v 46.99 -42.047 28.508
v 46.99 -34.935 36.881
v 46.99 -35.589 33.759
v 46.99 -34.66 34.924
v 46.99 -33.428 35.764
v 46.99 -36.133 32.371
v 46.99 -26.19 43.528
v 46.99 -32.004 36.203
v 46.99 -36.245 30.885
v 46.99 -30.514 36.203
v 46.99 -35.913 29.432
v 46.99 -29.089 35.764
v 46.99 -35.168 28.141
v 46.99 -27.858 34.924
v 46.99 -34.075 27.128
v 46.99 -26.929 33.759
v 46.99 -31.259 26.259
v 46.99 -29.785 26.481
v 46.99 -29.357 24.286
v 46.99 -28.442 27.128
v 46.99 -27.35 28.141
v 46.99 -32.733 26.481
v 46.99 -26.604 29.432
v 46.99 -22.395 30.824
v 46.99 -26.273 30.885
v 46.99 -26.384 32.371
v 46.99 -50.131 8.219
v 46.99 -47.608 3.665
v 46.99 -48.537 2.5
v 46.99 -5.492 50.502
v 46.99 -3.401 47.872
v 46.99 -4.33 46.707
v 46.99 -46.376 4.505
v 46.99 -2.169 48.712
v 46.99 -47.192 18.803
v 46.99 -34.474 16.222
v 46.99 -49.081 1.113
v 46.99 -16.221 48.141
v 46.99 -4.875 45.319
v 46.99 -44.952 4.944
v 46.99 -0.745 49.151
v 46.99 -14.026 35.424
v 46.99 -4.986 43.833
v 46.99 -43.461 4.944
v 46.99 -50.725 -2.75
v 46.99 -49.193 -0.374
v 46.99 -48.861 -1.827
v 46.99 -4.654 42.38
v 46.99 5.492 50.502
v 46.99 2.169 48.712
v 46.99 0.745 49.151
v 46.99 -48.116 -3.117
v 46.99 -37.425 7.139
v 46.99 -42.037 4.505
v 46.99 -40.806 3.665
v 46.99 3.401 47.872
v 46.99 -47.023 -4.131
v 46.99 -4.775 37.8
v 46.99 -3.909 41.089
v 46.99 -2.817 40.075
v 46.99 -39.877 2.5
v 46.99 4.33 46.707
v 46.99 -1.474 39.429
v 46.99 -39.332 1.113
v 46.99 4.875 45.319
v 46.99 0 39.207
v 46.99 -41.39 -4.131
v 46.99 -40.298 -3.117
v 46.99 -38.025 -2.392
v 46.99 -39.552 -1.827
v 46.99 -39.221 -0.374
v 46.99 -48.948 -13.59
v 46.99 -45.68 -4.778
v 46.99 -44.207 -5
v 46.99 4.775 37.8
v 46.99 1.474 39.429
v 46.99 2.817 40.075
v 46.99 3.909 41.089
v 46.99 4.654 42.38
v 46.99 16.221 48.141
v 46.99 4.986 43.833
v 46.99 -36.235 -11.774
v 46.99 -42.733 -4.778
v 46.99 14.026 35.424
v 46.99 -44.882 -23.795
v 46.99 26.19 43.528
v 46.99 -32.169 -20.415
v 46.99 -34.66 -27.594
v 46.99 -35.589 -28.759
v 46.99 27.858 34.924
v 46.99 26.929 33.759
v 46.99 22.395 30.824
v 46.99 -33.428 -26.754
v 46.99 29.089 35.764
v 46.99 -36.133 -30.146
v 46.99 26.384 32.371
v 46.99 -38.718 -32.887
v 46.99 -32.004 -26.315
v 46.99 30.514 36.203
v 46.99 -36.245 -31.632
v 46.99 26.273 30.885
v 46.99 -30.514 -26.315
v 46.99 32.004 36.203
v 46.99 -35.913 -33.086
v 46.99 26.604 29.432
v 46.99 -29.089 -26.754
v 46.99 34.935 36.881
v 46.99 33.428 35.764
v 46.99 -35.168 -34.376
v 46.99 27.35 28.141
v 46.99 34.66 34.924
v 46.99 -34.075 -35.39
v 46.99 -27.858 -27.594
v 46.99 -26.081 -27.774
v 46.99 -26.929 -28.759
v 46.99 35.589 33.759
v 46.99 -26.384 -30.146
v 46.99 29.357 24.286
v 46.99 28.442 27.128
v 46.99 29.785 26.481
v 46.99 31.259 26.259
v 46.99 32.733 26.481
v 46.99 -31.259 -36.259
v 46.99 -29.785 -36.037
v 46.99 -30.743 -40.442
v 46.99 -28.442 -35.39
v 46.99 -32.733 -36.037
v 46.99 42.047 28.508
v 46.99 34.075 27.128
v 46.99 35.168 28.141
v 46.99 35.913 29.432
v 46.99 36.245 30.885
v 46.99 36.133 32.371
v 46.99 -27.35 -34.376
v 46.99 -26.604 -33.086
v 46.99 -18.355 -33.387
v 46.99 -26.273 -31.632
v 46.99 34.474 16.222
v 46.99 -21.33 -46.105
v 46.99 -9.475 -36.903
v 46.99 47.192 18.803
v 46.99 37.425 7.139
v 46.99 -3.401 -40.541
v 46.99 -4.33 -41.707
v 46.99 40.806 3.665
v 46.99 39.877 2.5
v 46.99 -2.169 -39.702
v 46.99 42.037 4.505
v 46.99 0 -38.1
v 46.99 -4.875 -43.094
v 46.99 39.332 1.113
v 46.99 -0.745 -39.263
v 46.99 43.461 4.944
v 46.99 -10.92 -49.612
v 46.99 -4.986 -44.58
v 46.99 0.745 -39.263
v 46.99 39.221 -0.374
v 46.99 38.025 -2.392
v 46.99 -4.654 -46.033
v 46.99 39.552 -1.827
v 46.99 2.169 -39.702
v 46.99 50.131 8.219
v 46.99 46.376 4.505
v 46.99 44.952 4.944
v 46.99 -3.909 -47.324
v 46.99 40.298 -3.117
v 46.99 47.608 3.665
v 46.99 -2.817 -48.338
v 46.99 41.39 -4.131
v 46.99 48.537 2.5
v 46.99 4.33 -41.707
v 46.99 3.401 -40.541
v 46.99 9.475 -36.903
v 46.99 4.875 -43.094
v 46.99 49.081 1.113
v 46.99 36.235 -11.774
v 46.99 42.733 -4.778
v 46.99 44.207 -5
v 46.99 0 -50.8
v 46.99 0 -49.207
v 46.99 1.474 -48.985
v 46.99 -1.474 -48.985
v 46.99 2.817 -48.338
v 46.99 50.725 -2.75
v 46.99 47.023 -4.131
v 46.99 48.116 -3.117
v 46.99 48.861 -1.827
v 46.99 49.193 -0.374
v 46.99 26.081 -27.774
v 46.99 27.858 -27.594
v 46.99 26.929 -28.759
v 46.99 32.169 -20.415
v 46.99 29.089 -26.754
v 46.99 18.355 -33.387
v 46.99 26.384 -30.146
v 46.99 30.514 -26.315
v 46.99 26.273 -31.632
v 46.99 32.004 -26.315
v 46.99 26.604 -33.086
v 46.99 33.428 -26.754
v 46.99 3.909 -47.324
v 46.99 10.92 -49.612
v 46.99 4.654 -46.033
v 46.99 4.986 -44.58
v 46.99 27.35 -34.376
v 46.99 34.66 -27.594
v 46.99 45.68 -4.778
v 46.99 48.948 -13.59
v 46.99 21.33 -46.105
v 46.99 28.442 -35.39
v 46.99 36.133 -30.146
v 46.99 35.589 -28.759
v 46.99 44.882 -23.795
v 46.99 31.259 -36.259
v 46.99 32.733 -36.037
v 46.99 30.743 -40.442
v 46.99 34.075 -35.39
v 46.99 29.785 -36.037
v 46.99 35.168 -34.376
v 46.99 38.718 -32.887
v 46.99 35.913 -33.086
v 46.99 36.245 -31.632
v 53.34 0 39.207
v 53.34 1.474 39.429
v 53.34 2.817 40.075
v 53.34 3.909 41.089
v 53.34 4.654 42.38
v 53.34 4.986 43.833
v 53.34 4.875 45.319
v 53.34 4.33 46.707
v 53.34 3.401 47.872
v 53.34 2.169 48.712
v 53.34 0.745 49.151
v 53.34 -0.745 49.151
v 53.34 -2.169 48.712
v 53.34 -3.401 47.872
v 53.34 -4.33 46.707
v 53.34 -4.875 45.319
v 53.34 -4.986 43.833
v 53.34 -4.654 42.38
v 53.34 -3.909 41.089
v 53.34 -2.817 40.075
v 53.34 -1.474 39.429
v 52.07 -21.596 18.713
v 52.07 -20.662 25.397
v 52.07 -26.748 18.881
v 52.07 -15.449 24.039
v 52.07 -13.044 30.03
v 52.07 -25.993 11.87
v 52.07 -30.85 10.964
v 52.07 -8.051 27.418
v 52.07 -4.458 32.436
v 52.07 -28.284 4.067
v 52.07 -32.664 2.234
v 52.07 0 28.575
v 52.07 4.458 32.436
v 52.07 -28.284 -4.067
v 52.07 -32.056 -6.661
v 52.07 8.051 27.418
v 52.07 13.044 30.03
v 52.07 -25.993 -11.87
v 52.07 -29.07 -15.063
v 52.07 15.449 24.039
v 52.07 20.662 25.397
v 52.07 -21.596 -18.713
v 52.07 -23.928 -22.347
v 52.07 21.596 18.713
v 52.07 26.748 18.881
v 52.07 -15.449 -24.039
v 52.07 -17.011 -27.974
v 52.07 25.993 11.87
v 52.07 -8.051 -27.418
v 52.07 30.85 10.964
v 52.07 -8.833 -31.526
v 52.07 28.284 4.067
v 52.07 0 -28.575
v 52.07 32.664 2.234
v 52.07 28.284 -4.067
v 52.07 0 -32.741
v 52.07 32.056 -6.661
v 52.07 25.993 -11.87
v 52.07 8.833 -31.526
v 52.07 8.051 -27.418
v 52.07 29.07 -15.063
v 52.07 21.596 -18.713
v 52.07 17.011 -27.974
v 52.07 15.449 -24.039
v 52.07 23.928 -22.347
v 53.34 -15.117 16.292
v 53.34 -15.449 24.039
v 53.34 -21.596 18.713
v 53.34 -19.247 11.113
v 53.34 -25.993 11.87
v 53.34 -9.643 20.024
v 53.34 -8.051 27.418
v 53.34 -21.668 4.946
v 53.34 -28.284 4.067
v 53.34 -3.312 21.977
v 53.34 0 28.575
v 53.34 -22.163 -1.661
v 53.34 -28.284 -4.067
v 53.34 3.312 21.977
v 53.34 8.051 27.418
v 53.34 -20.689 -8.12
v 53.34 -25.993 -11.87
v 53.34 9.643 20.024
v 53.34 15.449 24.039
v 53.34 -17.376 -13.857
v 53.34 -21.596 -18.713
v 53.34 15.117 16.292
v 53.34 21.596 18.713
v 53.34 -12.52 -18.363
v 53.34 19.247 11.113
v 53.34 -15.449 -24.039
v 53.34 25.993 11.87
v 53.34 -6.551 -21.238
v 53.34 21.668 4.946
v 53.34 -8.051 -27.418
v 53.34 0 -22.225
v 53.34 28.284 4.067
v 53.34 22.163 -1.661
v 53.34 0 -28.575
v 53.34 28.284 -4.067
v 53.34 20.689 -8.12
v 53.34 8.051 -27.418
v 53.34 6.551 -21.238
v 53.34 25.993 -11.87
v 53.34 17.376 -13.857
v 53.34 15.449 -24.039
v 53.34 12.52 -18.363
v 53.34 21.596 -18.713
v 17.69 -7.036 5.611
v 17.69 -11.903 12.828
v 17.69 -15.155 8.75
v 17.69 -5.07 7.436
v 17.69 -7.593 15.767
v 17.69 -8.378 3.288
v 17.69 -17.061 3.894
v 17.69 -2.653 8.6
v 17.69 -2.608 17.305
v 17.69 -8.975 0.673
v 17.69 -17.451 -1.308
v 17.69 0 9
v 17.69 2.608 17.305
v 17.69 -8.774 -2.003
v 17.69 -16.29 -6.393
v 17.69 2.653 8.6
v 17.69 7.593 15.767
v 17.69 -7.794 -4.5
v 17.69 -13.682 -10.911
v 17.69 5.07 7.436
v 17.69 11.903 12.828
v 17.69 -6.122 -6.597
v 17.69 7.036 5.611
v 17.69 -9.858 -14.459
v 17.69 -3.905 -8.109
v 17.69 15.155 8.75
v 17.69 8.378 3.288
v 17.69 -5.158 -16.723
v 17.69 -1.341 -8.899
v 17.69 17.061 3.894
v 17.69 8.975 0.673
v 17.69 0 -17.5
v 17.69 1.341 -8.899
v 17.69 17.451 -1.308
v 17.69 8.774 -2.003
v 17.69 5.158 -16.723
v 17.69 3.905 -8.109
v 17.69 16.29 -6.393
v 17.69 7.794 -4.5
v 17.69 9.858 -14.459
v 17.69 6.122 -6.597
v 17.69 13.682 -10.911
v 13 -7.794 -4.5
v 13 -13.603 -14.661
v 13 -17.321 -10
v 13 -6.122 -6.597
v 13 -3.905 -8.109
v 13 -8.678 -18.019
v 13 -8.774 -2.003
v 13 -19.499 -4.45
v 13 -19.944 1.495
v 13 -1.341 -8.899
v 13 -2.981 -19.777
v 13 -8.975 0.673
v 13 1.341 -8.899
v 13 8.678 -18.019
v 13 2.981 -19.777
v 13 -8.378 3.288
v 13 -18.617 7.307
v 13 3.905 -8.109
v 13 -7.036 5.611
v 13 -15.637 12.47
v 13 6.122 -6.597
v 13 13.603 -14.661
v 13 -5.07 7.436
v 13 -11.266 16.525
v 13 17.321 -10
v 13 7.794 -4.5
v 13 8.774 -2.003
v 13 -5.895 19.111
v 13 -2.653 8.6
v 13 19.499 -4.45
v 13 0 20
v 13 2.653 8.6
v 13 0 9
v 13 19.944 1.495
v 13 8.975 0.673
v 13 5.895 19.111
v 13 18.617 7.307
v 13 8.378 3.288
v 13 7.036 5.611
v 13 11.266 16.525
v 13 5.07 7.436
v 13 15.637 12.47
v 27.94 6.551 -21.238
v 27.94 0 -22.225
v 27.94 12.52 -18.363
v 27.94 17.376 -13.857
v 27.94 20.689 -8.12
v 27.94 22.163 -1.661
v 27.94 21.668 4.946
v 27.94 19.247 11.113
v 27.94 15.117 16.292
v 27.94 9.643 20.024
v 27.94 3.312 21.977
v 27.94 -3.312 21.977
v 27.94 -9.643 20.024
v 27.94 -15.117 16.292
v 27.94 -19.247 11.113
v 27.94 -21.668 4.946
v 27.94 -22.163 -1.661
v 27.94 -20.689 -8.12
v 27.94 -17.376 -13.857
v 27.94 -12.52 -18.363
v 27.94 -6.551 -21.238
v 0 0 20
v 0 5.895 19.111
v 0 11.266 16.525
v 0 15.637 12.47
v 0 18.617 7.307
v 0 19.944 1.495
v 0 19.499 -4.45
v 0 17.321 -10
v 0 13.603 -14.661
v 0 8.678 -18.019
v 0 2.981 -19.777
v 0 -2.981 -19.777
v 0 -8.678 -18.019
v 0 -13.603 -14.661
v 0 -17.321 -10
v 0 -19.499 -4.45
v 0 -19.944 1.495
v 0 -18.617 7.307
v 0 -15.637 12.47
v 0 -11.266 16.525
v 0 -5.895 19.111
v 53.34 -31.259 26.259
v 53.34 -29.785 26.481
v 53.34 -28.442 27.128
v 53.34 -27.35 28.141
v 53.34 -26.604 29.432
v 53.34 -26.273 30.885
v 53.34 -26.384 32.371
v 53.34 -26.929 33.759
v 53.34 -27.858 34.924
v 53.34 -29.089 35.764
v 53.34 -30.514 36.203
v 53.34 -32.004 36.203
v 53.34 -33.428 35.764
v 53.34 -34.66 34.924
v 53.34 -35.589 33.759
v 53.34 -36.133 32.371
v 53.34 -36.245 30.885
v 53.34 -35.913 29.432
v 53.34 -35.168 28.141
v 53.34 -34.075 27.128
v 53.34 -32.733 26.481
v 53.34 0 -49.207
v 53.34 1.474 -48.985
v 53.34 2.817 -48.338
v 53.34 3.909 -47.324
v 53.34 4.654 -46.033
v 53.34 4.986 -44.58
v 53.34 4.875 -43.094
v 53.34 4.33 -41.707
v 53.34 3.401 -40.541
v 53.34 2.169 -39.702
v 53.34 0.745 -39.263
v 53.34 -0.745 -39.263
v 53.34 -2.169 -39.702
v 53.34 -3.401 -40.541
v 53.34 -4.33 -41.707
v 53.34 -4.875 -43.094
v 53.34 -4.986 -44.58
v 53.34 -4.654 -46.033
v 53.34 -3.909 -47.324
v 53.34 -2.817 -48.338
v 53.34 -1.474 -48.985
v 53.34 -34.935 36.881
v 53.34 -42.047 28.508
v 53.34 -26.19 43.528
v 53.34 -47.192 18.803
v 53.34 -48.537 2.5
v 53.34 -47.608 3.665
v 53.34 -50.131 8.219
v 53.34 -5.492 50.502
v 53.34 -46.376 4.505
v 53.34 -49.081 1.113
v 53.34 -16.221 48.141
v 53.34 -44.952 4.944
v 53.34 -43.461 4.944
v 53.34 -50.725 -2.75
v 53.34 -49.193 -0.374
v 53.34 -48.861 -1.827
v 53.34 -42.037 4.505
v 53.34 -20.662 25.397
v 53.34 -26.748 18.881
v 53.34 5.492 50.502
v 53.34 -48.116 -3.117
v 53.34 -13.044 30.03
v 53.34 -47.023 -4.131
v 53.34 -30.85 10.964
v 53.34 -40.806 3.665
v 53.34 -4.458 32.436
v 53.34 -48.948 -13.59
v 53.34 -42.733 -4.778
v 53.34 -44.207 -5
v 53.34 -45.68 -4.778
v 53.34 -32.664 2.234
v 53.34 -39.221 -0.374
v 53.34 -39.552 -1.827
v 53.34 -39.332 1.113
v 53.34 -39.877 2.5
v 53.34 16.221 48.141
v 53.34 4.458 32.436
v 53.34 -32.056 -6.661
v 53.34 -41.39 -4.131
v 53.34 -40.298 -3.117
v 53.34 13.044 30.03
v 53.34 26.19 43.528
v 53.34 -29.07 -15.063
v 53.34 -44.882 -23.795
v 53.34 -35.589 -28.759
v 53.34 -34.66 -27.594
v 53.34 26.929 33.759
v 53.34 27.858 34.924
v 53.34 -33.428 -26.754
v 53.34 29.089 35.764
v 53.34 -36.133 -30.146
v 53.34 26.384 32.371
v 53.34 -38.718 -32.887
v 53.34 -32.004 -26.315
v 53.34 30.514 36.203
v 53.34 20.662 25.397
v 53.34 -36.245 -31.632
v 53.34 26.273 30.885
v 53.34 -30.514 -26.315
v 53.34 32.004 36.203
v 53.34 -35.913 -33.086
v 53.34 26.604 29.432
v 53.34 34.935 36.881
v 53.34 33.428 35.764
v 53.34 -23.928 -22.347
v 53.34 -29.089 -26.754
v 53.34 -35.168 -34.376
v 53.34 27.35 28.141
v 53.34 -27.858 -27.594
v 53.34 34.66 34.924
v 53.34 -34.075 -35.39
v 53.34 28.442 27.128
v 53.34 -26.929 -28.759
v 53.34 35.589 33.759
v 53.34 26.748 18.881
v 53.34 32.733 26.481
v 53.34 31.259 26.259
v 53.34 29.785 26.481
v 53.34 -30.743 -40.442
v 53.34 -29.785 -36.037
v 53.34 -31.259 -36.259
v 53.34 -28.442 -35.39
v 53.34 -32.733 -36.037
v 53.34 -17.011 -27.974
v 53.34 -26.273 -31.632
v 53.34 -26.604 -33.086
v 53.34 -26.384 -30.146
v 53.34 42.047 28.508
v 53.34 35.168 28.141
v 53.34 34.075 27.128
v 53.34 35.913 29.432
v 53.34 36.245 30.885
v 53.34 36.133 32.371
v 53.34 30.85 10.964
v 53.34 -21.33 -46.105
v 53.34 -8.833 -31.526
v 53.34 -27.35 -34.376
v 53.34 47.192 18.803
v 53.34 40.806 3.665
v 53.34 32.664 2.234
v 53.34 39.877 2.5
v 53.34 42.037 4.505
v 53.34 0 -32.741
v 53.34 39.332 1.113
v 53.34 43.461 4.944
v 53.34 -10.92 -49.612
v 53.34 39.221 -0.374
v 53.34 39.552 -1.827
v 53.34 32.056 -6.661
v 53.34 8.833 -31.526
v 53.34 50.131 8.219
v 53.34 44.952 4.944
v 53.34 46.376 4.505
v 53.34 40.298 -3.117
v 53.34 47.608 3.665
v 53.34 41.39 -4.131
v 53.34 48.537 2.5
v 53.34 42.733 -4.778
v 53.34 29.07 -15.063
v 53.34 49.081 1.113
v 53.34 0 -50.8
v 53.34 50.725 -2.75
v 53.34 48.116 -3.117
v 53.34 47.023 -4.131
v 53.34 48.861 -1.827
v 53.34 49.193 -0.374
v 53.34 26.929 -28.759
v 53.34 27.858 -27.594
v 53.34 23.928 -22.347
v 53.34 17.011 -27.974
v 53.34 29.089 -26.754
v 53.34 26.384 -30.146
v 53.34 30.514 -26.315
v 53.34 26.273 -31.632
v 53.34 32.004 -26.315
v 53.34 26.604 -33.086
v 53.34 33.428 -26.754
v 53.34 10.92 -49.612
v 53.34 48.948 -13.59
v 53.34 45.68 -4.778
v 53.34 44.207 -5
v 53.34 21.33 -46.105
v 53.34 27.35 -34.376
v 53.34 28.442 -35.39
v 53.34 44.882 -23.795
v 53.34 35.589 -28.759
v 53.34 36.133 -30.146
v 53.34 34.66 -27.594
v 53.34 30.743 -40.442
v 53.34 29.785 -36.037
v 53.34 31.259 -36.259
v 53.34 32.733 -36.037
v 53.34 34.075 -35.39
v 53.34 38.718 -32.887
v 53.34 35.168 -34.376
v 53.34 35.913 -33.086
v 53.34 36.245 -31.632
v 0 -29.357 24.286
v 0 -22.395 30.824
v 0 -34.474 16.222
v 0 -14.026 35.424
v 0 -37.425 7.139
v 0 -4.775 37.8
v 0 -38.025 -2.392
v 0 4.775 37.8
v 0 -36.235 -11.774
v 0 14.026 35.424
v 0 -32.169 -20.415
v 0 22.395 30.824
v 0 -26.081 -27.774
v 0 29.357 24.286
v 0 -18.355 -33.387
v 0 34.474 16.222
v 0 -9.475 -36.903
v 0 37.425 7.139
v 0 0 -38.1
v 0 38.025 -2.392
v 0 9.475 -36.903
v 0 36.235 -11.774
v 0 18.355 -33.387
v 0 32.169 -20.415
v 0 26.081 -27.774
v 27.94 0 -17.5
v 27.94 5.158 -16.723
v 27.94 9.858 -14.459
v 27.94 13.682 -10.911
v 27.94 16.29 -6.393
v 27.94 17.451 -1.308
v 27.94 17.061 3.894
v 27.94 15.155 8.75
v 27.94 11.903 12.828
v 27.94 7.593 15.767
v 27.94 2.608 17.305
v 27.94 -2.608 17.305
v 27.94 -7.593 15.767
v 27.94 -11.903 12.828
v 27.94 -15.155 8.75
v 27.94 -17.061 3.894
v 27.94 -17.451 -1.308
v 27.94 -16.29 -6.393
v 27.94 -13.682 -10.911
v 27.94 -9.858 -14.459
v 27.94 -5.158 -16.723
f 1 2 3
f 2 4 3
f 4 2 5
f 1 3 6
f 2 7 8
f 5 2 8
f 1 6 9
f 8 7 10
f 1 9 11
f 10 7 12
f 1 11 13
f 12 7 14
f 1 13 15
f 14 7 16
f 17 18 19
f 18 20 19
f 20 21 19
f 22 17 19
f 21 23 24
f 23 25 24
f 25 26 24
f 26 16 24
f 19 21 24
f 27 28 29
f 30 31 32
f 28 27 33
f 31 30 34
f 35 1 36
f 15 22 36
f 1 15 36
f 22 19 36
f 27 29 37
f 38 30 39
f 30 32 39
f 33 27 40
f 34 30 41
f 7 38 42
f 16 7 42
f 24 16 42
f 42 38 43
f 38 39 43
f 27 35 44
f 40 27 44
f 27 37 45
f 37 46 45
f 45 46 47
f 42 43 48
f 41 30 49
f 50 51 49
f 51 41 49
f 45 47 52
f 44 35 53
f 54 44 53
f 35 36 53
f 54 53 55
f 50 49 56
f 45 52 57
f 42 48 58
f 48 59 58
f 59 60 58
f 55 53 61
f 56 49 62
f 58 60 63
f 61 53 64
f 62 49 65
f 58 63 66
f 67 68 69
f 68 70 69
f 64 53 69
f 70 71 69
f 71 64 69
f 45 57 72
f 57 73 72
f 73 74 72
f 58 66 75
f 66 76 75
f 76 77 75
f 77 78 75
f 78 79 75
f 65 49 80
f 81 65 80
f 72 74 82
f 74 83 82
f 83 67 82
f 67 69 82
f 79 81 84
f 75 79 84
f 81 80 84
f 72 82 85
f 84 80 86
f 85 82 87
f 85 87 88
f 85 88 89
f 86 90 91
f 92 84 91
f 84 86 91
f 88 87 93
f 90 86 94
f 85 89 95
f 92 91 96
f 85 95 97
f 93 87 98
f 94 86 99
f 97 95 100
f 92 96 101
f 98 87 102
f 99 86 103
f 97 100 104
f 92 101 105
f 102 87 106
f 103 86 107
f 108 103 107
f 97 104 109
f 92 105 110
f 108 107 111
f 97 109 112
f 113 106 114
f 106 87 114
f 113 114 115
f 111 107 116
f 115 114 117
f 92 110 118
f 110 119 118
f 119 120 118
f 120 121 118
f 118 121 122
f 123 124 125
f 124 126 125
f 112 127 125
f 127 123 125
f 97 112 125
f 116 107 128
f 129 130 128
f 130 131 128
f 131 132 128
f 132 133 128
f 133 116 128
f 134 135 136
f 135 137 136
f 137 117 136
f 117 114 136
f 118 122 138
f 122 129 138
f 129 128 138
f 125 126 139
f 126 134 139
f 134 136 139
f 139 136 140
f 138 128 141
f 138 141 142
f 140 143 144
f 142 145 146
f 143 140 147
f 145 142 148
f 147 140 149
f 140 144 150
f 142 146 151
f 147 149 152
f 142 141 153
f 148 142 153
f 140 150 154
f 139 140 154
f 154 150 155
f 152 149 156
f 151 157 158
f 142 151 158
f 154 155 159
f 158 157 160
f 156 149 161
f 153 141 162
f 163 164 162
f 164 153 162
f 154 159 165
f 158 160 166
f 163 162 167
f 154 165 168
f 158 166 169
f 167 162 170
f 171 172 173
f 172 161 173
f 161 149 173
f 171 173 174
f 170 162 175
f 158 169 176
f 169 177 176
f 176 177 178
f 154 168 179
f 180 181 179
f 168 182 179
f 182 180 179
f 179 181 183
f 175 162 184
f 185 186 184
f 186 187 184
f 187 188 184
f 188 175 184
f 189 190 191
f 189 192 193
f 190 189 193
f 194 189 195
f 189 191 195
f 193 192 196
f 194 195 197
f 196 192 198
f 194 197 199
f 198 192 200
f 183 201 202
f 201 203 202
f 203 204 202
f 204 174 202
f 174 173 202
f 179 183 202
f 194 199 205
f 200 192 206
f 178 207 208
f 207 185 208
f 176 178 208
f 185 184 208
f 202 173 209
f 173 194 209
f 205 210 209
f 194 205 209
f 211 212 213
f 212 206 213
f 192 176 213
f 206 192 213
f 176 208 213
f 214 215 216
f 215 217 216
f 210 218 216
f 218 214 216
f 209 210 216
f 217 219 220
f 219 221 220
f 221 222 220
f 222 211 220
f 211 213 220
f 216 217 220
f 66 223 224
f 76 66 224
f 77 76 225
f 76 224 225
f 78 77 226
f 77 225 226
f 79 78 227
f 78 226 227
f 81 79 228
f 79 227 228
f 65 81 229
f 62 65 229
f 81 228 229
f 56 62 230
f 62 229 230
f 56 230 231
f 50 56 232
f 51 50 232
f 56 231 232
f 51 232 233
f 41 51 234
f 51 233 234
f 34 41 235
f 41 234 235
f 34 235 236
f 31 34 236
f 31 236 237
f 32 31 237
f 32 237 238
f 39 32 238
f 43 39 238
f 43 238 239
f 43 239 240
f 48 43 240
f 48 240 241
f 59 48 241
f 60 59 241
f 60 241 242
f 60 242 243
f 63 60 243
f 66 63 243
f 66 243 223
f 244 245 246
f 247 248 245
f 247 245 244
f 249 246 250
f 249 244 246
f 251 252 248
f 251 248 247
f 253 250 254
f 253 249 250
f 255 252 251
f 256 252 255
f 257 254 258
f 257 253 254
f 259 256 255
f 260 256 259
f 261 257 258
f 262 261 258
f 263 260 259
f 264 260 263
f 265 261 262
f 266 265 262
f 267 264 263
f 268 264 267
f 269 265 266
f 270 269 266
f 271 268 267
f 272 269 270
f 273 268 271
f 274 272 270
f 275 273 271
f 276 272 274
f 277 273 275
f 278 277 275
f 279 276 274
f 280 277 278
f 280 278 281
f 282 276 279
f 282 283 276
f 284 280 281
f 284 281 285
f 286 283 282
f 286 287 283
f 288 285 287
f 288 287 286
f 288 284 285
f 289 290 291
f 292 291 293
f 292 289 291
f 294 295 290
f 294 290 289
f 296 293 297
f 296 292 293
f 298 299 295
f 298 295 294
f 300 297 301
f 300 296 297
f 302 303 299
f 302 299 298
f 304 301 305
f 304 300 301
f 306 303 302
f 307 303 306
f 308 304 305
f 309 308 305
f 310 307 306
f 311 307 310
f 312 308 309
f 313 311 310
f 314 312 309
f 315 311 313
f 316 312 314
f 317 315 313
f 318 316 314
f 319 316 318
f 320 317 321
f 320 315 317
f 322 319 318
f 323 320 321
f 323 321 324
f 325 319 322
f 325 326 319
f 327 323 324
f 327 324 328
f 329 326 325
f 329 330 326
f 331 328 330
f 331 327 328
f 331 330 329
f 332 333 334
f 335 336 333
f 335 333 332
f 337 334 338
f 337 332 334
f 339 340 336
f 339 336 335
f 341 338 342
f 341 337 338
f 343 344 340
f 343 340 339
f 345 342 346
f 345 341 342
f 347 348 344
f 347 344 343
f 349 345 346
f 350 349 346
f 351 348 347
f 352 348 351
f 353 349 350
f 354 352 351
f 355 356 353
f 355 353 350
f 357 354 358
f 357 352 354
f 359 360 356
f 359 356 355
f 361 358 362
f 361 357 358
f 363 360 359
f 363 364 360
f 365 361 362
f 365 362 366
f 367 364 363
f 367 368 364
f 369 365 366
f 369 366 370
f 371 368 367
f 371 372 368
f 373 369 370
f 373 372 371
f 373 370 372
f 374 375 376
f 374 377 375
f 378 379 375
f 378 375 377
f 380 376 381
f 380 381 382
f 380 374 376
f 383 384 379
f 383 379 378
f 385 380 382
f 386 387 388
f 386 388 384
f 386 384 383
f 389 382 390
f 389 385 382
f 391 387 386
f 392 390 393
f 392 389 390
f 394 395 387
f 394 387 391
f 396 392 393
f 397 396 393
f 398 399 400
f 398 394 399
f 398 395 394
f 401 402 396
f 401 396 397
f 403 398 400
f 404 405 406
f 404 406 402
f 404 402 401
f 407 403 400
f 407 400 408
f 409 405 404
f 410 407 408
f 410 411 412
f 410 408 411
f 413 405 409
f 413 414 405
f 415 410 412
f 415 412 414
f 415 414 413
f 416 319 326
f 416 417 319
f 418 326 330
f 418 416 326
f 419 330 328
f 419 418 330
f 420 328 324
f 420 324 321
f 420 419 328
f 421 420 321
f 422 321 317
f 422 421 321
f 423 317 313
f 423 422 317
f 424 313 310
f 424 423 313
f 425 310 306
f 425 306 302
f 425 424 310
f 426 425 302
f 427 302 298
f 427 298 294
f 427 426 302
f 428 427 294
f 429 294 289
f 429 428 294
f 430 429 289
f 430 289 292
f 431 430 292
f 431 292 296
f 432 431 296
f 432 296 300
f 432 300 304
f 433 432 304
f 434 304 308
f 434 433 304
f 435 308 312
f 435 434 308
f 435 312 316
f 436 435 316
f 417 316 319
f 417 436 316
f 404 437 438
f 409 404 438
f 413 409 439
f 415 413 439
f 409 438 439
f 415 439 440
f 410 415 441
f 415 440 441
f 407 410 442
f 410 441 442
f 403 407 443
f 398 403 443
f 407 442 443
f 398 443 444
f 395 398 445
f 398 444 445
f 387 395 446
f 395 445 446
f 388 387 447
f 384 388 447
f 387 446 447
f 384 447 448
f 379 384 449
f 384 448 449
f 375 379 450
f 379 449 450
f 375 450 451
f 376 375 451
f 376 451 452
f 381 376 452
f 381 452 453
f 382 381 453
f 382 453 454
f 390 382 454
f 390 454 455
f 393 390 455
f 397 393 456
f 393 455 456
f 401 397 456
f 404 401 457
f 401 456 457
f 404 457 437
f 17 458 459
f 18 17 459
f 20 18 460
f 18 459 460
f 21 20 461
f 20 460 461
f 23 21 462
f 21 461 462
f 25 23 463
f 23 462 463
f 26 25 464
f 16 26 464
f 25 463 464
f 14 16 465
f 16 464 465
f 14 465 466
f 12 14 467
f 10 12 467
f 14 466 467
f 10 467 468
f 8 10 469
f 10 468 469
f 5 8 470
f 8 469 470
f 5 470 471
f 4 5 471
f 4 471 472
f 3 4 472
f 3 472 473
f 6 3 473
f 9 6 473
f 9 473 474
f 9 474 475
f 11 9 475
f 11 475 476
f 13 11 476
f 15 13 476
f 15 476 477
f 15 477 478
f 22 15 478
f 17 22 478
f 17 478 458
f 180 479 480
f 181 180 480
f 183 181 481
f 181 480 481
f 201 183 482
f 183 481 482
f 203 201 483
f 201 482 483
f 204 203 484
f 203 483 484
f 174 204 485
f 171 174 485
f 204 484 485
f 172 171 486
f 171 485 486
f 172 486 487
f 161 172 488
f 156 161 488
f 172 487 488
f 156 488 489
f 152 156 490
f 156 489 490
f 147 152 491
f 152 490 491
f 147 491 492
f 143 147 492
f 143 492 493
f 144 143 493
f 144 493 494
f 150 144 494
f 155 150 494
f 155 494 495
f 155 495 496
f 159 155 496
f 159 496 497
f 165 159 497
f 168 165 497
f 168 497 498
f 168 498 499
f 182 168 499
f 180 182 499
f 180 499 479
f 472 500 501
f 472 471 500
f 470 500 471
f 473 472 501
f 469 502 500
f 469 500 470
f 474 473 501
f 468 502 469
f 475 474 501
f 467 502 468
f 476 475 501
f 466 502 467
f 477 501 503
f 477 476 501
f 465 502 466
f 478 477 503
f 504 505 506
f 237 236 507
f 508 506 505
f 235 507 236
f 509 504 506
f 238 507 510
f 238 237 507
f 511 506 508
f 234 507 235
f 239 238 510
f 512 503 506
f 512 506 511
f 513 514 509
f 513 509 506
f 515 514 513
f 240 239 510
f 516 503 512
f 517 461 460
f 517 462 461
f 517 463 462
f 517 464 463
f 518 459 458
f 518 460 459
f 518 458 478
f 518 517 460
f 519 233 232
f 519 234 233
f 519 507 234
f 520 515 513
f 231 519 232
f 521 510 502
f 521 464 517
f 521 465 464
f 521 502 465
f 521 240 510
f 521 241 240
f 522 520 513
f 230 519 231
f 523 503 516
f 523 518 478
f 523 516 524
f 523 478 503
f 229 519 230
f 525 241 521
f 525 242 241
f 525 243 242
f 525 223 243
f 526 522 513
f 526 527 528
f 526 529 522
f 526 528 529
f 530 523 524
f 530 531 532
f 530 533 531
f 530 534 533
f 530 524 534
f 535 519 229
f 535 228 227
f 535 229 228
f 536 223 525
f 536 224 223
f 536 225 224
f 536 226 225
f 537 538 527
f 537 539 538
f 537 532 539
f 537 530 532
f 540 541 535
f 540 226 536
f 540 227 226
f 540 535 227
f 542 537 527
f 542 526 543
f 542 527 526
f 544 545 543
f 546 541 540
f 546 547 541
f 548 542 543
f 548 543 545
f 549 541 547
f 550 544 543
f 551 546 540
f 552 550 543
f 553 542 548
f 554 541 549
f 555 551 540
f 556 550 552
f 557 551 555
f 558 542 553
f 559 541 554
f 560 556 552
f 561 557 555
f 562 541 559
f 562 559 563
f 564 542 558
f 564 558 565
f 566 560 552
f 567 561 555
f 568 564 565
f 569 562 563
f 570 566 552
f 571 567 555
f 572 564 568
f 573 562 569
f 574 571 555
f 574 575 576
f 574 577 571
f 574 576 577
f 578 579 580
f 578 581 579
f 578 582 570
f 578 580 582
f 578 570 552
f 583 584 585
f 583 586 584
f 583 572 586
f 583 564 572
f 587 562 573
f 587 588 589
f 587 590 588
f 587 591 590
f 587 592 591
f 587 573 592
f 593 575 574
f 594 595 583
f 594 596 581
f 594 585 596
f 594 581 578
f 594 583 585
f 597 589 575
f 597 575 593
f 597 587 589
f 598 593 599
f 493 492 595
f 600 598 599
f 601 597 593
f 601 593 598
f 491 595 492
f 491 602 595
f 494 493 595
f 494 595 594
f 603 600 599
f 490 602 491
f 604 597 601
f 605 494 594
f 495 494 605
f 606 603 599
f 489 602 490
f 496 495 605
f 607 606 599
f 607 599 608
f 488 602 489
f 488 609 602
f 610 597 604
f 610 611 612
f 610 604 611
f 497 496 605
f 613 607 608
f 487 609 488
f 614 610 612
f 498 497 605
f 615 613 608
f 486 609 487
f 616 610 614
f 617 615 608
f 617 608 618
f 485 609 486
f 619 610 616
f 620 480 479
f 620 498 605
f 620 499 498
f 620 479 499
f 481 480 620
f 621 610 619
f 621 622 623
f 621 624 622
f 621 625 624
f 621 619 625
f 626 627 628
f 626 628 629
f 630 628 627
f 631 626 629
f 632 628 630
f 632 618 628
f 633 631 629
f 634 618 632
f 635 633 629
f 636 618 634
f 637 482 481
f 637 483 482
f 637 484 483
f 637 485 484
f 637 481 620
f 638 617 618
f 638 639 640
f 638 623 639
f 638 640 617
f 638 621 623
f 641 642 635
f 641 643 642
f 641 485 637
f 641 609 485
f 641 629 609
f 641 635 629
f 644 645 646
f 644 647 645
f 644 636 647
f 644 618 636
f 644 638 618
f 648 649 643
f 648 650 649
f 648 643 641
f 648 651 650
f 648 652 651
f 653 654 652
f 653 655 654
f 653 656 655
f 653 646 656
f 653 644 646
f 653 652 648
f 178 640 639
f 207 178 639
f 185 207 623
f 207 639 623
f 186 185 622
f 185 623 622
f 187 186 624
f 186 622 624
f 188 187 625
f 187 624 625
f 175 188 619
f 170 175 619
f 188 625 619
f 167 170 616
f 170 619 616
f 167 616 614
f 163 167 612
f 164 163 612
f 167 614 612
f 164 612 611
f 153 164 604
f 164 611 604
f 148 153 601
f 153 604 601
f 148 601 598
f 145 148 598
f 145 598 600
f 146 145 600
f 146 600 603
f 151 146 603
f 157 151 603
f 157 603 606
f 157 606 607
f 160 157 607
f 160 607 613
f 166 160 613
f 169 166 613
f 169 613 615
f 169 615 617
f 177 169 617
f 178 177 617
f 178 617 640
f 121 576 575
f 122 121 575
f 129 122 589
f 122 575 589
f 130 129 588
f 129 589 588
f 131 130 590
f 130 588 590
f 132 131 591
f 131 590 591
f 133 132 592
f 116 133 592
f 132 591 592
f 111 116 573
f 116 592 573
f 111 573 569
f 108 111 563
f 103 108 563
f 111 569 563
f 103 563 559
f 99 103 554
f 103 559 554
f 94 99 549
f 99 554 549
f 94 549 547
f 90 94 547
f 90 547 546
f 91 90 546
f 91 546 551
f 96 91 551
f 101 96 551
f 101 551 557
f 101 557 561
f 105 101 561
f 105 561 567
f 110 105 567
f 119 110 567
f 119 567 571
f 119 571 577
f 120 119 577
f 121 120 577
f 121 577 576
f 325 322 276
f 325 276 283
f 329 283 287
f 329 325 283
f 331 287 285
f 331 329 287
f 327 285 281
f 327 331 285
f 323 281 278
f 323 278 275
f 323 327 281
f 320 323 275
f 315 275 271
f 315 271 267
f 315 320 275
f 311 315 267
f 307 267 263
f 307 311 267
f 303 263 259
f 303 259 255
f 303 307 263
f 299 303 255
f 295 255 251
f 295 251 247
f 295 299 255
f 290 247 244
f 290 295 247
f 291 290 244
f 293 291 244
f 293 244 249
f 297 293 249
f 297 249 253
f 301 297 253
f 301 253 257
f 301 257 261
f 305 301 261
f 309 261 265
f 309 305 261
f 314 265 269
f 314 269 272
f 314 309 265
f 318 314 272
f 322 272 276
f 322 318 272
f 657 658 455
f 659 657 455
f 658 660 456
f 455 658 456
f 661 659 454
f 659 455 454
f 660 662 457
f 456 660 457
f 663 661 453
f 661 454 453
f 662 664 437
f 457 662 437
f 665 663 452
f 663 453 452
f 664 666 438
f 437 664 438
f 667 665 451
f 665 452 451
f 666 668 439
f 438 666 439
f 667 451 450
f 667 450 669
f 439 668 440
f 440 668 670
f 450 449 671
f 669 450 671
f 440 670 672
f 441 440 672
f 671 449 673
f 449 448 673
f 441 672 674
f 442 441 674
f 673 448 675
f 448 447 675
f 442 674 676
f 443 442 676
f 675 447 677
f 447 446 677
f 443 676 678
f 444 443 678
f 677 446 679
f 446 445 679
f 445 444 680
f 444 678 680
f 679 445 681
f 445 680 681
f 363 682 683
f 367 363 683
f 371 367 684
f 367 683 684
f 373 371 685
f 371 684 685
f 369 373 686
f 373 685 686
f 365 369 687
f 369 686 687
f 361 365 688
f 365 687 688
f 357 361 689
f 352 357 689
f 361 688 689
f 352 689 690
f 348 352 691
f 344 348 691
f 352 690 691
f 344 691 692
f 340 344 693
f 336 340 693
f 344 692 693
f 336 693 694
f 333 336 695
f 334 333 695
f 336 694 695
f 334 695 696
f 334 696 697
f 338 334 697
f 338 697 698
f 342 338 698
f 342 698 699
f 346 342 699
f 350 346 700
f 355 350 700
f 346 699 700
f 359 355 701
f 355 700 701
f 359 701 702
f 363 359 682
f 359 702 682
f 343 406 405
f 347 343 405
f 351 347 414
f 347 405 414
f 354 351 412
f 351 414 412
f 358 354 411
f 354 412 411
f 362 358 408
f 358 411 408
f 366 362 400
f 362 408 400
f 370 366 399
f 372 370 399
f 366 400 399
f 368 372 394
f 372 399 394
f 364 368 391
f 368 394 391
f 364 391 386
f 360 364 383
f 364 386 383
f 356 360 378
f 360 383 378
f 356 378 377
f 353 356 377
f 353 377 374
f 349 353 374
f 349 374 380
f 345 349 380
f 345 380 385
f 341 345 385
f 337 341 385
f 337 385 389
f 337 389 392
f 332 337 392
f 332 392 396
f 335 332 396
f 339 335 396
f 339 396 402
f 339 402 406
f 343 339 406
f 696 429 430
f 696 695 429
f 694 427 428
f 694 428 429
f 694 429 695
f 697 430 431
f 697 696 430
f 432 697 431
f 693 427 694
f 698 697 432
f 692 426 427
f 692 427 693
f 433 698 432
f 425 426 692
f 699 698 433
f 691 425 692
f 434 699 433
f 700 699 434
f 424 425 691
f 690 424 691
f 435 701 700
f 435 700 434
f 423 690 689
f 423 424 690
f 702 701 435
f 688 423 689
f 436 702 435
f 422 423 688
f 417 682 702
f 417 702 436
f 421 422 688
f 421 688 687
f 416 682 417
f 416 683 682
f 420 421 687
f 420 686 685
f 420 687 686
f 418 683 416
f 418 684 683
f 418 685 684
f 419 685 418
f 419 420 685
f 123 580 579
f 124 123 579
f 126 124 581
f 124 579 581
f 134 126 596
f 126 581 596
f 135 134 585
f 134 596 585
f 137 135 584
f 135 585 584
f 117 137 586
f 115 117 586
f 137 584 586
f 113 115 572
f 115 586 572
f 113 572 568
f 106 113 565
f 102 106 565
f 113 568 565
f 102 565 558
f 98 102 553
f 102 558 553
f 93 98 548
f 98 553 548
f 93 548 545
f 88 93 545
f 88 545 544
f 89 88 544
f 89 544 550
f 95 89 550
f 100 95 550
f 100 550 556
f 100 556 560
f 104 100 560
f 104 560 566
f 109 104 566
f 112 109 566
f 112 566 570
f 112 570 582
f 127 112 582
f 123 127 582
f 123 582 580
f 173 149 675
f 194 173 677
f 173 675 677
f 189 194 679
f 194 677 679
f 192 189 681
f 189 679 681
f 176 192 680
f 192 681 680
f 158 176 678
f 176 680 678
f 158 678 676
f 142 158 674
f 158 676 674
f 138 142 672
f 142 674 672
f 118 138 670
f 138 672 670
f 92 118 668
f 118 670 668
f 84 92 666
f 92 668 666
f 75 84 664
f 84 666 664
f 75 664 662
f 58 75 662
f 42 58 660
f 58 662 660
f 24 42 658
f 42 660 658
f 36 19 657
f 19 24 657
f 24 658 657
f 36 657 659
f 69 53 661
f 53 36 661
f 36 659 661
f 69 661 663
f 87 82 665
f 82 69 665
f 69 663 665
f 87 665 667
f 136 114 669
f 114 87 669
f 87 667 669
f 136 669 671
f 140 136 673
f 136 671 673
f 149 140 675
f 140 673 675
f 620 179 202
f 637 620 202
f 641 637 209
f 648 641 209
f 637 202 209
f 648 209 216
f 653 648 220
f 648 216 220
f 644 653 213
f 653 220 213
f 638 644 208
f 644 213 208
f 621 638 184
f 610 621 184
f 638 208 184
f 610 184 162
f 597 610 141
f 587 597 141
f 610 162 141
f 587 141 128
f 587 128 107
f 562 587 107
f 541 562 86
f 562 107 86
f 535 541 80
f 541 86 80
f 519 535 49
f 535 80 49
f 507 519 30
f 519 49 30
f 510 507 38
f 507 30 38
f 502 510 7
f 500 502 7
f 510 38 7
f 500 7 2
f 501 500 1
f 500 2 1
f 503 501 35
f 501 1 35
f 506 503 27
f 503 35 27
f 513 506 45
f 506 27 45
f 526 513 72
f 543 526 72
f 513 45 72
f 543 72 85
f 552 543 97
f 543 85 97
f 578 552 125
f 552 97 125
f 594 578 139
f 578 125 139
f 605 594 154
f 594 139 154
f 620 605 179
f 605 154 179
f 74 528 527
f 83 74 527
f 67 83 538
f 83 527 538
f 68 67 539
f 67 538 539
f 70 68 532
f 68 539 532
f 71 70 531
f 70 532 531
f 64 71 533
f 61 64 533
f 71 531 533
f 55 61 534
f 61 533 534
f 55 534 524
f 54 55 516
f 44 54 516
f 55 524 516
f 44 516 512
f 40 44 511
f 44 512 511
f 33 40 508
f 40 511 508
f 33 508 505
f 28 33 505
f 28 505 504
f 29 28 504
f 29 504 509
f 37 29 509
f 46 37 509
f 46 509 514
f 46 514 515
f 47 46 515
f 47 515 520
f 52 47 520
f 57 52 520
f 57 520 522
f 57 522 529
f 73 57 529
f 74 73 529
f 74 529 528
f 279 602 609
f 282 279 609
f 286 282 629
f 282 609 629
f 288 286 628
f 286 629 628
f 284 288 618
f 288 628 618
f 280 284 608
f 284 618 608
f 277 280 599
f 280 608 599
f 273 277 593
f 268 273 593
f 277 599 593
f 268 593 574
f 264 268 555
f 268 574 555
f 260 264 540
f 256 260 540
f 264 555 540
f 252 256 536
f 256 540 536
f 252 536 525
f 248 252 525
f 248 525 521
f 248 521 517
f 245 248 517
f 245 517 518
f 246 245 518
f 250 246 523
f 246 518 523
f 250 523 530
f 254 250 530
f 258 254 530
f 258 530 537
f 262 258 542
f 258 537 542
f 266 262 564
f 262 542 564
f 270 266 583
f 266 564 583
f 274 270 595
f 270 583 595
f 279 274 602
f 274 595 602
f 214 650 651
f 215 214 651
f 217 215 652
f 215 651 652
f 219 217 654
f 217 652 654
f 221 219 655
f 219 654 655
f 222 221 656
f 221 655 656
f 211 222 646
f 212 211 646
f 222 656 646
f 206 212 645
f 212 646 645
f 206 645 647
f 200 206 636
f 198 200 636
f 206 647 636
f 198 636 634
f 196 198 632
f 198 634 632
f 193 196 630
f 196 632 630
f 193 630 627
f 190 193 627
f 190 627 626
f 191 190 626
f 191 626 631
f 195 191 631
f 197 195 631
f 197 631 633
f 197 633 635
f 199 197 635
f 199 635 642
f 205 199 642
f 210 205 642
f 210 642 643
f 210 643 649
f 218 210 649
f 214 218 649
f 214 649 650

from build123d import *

# Parameters (mm, degrees)
SKETCH1_R                 = 38.1
MAIN_BODY_DEPTH           = 27.94
SKETCH2_R                 = 17.5
STATIC_SEAL_HOLE_DEPTH    = 10.25
SHAFT_HOLE_D              = 18
SKETCH14_R                = 38.1
SKETCH14_R_2              = 22.225
ROTATING_SEAL_SPACE_DEPTH = 25.4
FACE_START                = -6.35
SKETCH7_R                 = 50.8
SKETCH7_R_2               = 22.225
FACE_JOINT_DEPTH          = 6.35
SKETCH8_R                 = 20
BEARING_HOLE_DEPTH        = 13
SCREW_HOLES_D             = 10
SKETCH16_R                = 32.7406
SKETCH16_R_2              = 28.575
GASKET_RING_DEPTH         = 1.27


with BuildPart() as part:
    # Sketch1 → main body (new body)
    with BuildSketch(Plane(origin=(0, 0, 0), x_dir=(0, 0, -1), z_dir=(1, 0, 0))):
        Circle(SKETCH1_R)
    extrude(amount=MAIN_BODY_DEPTH)

    # Sketch2 → Static Seal Hole (cut)
    with BuildSketch(Plane(origin=(27.94, 0, 0), x_dir=(0, 0, -1), z_dir=(1, 0, 0))):
        Circle(SKETCH2_R)
    extrude(amount=-STATIC_SEAL_HOLE_DEPTH, mode=Mode.SUBTRACT)

    # Shaft hole (through all)
    with Locations(Plane(origin=(17.69, 0, 0), x_dir=(0, 0, -1), z_dir=(1, 0, 0))):
        with Locations((0, 0)):
            Hole(SHAFT_HOLE_D / 2)

    # Sketch14 → rotating seal space (add)
    with BuildSketch(Plane(origin=(27.94, 0, 0), x_dir=(0, 0, -1), z_dir=(1, 0, 0))):
        Circle(SKETCH14_R)
        Circle(SKETCH14_R_2, mode=Mode.SUBTRACT)
    extrude(amount=ROTATING_SEAL_SPACE_DEPTH)

    # Sketch7 → face joint (add)
    with BuildSketch(Plane(origin=(53.34, 0, 0), x_dir=(0, 0, -1), z_dir=(1, 0, 0)).offset(FACE_START)):
        Circle(SKETCH7_R)
        Circle(SKETCH7_R_2, mode=Mode.SUBTRACT)
    extrude(amount=FACE_JOINT_DEPTH)

    # Sketch8 → bearing hole (cut)
    with BuildSketch(Plane.ZY):
        Circle(SKETCH8_R)
    extrude(amount=-BEARING_HOLE_DEPTH, mode=Mode.SUBTRACT)

    # Screw holes (through all)
    with Locations(Plane.ZY.offset(-46.99)):
        with Locations((-44.206688043, 0), (-31.258848889, 31.258848889), (0, 44.206688043), (31.258848889, 31.258848889), (44.206688043, 0), (31.258848889, -31.258848889), (0, -44.206688043), (-31.258848889, -31.258848889), (0, 0)):
            Hole(SCREW_HOLES_D / 2)

    # Sketch16 → Gasket ring (cut)
    with BuildSketch(Plane(origin=(53.34, 0, 0), x_dir=(0, 0, -1), z_dir=(1, 0, 0))):
        Circle(SKETCH16_R)
        Circle(SKETCH16_R_2, mode=Mode.SUBTRACT)
    extrude(amount=-GASKET_RING_DEPTH, mode=Mode.SUBTRACT)


solid = part.part
